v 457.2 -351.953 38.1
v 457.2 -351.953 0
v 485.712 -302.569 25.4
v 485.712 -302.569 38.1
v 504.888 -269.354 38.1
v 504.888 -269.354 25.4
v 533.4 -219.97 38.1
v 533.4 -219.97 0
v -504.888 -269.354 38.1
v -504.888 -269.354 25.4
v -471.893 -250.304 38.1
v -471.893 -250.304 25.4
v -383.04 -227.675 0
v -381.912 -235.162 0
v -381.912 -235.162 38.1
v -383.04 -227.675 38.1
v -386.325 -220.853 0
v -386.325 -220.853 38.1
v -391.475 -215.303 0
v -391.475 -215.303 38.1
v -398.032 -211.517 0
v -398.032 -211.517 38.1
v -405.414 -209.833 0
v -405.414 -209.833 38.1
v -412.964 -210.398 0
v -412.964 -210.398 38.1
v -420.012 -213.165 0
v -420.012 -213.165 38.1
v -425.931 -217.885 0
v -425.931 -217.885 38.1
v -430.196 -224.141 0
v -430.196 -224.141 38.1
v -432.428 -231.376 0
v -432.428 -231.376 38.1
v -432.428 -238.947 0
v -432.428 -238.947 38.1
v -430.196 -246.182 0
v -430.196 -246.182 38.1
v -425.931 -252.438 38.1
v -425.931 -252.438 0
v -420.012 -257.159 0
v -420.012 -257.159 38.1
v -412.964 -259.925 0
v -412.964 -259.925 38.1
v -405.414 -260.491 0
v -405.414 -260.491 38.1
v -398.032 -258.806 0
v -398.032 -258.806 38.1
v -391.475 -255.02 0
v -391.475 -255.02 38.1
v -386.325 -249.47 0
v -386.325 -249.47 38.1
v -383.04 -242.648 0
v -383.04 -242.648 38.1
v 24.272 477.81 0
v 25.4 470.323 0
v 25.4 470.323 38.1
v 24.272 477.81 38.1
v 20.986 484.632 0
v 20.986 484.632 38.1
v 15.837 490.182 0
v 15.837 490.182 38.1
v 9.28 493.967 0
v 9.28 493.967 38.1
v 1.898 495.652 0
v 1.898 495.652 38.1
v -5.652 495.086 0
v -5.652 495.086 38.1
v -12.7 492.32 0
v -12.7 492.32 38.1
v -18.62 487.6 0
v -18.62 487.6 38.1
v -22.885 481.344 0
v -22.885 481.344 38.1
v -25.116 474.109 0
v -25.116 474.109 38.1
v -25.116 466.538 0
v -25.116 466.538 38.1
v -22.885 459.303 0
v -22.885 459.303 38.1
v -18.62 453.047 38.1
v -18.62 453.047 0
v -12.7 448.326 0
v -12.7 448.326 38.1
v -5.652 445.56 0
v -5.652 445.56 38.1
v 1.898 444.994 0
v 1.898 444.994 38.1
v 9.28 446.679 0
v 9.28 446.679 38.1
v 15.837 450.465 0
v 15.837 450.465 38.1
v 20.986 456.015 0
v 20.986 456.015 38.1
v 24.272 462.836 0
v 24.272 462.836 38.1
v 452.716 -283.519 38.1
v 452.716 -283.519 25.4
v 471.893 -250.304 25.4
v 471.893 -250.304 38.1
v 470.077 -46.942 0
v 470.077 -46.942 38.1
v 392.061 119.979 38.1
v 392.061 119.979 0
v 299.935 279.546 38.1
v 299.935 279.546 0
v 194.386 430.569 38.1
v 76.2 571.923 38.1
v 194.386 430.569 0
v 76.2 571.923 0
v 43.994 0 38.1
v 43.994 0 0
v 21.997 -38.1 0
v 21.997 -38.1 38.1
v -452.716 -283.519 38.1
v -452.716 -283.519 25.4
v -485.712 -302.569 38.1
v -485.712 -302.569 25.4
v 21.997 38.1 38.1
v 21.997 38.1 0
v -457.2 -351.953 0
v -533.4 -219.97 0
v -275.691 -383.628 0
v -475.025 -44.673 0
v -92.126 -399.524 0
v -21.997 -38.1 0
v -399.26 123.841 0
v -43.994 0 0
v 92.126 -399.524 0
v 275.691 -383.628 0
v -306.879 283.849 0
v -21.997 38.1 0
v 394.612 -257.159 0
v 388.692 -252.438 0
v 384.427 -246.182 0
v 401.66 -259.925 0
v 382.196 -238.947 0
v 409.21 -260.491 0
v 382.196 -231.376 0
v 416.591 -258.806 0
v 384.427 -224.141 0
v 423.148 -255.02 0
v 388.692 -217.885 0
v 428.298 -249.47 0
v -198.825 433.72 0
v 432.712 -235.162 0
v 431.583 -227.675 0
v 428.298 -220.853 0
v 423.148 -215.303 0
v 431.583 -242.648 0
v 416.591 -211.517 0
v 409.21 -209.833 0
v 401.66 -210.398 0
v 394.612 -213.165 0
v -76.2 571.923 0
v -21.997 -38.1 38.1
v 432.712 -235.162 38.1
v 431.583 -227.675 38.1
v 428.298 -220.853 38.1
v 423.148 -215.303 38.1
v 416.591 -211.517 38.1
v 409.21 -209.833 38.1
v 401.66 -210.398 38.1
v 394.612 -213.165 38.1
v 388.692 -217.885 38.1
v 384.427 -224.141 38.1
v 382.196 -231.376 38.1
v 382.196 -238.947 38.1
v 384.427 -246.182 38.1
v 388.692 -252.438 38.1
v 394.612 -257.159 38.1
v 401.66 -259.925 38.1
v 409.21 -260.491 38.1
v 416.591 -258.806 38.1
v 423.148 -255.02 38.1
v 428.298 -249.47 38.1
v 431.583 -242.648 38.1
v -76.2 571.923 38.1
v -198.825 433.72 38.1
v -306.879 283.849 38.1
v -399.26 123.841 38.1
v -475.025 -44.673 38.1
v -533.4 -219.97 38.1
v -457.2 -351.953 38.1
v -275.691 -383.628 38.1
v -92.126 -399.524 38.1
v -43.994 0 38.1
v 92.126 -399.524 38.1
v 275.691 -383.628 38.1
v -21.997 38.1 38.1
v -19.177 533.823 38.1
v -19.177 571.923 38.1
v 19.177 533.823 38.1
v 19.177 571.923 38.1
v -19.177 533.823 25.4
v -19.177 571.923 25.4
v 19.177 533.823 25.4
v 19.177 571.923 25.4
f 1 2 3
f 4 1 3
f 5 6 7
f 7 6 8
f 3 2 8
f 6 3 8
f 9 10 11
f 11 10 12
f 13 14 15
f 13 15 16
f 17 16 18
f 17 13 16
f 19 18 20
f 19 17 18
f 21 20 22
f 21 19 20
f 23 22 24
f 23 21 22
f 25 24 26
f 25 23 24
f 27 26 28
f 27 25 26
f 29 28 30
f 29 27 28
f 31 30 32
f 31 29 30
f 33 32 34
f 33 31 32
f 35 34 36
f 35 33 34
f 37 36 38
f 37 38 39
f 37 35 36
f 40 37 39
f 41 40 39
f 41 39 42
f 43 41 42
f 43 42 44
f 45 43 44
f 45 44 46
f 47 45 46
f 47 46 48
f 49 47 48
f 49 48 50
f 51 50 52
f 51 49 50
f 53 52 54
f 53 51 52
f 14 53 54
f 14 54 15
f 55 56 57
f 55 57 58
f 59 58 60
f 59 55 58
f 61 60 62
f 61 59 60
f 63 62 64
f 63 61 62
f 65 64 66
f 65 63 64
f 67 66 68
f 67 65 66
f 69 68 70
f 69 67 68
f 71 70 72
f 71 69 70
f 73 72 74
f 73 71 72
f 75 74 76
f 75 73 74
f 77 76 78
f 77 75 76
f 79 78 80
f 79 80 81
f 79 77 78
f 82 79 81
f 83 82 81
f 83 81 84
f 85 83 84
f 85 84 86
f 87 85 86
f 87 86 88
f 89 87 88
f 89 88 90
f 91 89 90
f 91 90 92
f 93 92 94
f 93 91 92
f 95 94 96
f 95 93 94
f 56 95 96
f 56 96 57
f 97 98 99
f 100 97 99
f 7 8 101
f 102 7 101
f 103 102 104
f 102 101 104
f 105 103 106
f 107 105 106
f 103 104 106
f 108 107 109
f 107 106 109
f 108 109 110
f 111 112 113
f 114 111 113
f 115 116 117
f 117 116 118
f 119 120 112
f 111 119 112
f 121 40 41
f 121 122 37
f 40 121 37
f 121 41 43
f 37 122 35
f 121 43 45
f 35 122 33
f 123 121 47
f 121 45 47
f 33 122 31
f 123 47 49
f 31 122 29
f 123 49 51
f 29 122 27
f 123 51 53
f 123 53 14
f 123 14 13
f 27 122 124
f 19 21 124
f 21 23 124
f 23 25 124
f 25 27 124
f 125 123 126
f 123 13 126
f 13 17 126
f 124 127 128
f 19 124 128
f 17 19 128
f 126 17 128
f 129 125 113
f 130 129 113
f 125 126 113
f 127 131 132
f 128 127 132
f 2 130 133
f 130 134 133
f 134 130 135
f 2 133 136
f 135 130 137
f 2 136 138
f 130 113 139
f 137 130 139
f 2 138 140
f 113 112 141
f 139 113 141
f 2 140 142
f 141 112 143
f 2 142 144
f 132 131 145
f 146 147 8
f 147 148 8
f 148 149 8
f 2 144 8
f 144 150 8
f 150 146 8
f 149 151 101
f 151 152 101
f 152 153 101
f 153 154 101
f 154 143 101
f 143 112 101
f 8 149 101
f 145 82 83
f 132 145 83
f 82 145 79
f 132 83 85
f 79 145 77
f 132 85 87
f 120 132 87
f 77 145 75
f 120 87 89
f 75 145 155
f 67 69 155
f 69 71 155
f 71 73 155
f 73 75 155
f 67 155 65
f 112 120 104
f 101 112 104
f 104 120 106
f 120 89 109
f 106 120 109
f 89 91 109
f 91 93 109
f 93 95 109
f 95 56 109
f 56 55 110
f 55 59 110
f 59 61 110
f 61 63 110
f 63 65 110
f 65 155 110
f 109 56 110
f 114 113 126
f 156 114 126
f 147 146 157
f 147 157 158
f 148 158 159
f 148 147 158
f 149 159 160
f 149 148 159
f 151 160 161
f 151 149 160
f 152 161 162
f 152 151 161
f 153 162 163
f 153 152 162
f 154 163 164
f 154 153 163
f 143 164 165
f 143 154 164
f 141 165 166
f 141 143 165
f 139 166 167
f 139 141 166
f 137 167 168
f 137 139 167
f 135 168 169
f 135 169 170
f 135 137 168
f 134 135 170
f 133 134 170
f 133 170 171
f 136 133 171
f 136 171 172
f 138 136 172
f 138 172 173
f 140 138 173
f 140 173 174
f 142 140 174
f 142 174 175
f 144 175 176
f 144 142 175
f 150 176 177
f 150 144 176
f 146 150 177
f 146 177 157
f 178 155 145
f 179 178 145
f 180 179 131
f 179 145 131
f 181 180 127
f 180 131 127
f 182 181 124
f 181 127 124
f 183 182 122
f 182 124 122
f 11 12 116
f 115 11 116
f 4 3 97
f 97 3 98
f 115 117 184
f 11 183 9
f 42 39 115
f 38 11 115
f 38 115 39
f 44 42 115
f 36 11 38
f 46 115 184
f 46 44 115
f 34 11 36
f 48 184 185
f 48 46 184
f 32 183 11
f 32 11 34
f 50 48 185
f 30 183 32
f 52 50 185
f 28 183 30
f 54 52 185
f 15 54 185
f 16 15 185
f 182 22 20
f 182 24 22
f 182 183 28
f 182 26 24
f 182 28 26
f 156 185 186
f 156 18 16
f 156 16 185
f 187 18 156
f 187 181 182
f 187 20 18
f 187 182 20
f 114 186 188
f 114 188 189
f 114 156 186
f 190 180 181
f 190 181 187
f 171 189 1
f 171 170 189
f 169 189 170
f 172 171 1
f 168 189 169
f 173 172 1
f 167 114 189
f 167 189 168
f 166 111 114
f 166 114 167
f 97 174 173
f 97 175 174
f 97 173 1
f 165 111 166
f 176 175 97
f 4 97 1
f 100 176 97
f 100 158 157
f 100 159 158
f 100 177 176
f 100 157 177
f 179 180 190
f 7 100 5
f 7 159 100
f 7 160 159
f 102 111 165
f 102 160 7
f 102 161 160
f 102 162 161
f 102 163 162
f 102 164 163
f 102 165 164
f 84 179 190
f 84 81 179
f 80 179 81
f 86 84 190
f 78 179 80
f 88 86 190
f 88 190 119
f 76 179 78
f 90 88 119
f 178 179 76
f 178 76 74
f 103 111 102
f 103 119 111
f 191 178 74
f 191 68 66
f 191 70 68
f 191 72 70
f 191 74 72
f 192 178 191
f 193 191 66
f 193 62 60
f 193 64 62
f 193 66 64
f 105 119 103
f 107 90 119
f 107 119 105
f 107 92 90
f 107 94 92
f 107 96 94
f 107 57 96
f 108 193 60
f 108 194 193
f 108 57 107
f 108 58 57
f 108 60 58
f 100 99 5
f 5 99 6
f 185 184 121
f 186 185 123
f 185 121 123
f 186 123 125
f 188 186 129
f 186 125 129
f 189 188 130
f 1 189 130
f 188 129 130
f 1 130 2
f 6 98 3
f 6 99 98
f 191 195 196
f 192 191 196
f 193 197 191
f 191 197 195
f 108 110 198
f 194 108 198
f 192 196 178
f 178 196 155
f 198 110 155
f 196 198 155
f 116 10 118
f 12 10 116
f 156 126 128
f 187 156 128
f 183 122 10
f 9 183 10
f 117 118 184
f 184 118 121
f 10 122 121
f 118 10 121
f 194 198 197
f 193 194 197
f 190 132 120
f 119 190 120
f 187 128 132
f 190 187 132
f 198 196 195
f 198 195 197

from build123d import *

# Parameters (mm, degrees)
F0_R     = 25.4
F2_DEPTH = 38.1
F0_W     = 38.354
F0_H     = 38.1
F3_DEPTH = 25.4


# Not quite as in the source:
# - a variable given as a bare number and used for a length is read in inches; the dataset says mm whatever the document's units were


with BuildPart() as f2:
    # F0 (on Top) → F2 (new body)
    with BuildSketch(Plane.XY):
        with BuildLine():
            ThreePointArc((-76.2, 571.9231766592), (-355.0918394716, 205.012369106), (-533.4, -219.9704525612))
            Line((-533.4, -219.9704525612), (-504.8885, -269.3538191612))
            Line((-504.8885, -269.3538191612), (-471.8929321158, -250.3038191612))
            Line((-471.8929321158, -250.3038191612), (-452.7159321158, -283.519357498))
            Line((-452.7159321158, -283.519357498), (-485.7115, -302.569357498))
            Line((-485.7115, -302.569357498), (-457.2, -351.952724098))
            ThreePointArc((-457.2, -351.952724098), (0, -401.5140680266), (457.2, -351.952724098))
            Line((457.2, -351.952724098), (485.7115, -302.569357498))
            Line((485.7115, -302.569357498), (452.7159321158, -283.519357498))
            Line((452.7159321158, -283.519357498), (471.8929321158, -250.3038191612))
            Line((471.8929321158, -250.3038191612), (504.8885, -269.3538191612))
            Line((504.8885, -269.3538191612), (533.4, -219.9704525612))
            ThreePointArc((533.4, -219.9704525612), (347.7213828878, 200.7570340133), (76.2, 571.9231766592))
            Line((76.2, 571.9231766592), (19.177, 571.9231766592))
            Line((19.177, 571.9231766592), (19.177, 533.8231766592))
            Line((19.177, 533.8231766592), (-19.177, 533.8231766592))
            Line((-19.177, 533.8231766592), (-19.177, 571.9231766592))
            Line((-19.177, 571.9231766592), (-76.2, 571.9231766592))
        make_face()
        with Locations((-407.3118189755, -235.1615883296)):
            Circle(F0_R, mode=Mode.SUBTRACT)
        Polygon((-21.9970452561, 38.1), (21.9970452561, 38.1), (43.9940905122, 0), (21.9970452561, -38.1), (-21.9970452561, -38.1), (-43.9940905122, 0), align=None, mode=Mode.SUBTRACT)
        with Locations((407.3118189755, -235.1615883296)):
            Circle(F0_R, mode=Mode.SUBTRACT)
        with Locations((0, 470.3231766592)):
            Circle(F0_R, mode=Mode.SUBTRACT)
    extrude(amount=F2_DEPTH)

    # F0 (on Top) → F3 (join)
    with BuildSketch(Plane.XY):
        Polygon((-471.8929321158, -250.3038191612), (-504.8885, -269.3538191612), (-485.7115, -302.569357498), (-452.7159321158, -283.519357498), align=None)
        Polygon((452.7159321158, -283.519357498), (485.7115, -302.569357498), (504.8885, -269.3538191612), (471.8929321158, -250.3038191612), align=None)
        with Locations((0, 552.8731766592)):
            Rectangle(F0_W, F0_H)
    extrude(amount=F3_DEPTH)


solid = f2.part
